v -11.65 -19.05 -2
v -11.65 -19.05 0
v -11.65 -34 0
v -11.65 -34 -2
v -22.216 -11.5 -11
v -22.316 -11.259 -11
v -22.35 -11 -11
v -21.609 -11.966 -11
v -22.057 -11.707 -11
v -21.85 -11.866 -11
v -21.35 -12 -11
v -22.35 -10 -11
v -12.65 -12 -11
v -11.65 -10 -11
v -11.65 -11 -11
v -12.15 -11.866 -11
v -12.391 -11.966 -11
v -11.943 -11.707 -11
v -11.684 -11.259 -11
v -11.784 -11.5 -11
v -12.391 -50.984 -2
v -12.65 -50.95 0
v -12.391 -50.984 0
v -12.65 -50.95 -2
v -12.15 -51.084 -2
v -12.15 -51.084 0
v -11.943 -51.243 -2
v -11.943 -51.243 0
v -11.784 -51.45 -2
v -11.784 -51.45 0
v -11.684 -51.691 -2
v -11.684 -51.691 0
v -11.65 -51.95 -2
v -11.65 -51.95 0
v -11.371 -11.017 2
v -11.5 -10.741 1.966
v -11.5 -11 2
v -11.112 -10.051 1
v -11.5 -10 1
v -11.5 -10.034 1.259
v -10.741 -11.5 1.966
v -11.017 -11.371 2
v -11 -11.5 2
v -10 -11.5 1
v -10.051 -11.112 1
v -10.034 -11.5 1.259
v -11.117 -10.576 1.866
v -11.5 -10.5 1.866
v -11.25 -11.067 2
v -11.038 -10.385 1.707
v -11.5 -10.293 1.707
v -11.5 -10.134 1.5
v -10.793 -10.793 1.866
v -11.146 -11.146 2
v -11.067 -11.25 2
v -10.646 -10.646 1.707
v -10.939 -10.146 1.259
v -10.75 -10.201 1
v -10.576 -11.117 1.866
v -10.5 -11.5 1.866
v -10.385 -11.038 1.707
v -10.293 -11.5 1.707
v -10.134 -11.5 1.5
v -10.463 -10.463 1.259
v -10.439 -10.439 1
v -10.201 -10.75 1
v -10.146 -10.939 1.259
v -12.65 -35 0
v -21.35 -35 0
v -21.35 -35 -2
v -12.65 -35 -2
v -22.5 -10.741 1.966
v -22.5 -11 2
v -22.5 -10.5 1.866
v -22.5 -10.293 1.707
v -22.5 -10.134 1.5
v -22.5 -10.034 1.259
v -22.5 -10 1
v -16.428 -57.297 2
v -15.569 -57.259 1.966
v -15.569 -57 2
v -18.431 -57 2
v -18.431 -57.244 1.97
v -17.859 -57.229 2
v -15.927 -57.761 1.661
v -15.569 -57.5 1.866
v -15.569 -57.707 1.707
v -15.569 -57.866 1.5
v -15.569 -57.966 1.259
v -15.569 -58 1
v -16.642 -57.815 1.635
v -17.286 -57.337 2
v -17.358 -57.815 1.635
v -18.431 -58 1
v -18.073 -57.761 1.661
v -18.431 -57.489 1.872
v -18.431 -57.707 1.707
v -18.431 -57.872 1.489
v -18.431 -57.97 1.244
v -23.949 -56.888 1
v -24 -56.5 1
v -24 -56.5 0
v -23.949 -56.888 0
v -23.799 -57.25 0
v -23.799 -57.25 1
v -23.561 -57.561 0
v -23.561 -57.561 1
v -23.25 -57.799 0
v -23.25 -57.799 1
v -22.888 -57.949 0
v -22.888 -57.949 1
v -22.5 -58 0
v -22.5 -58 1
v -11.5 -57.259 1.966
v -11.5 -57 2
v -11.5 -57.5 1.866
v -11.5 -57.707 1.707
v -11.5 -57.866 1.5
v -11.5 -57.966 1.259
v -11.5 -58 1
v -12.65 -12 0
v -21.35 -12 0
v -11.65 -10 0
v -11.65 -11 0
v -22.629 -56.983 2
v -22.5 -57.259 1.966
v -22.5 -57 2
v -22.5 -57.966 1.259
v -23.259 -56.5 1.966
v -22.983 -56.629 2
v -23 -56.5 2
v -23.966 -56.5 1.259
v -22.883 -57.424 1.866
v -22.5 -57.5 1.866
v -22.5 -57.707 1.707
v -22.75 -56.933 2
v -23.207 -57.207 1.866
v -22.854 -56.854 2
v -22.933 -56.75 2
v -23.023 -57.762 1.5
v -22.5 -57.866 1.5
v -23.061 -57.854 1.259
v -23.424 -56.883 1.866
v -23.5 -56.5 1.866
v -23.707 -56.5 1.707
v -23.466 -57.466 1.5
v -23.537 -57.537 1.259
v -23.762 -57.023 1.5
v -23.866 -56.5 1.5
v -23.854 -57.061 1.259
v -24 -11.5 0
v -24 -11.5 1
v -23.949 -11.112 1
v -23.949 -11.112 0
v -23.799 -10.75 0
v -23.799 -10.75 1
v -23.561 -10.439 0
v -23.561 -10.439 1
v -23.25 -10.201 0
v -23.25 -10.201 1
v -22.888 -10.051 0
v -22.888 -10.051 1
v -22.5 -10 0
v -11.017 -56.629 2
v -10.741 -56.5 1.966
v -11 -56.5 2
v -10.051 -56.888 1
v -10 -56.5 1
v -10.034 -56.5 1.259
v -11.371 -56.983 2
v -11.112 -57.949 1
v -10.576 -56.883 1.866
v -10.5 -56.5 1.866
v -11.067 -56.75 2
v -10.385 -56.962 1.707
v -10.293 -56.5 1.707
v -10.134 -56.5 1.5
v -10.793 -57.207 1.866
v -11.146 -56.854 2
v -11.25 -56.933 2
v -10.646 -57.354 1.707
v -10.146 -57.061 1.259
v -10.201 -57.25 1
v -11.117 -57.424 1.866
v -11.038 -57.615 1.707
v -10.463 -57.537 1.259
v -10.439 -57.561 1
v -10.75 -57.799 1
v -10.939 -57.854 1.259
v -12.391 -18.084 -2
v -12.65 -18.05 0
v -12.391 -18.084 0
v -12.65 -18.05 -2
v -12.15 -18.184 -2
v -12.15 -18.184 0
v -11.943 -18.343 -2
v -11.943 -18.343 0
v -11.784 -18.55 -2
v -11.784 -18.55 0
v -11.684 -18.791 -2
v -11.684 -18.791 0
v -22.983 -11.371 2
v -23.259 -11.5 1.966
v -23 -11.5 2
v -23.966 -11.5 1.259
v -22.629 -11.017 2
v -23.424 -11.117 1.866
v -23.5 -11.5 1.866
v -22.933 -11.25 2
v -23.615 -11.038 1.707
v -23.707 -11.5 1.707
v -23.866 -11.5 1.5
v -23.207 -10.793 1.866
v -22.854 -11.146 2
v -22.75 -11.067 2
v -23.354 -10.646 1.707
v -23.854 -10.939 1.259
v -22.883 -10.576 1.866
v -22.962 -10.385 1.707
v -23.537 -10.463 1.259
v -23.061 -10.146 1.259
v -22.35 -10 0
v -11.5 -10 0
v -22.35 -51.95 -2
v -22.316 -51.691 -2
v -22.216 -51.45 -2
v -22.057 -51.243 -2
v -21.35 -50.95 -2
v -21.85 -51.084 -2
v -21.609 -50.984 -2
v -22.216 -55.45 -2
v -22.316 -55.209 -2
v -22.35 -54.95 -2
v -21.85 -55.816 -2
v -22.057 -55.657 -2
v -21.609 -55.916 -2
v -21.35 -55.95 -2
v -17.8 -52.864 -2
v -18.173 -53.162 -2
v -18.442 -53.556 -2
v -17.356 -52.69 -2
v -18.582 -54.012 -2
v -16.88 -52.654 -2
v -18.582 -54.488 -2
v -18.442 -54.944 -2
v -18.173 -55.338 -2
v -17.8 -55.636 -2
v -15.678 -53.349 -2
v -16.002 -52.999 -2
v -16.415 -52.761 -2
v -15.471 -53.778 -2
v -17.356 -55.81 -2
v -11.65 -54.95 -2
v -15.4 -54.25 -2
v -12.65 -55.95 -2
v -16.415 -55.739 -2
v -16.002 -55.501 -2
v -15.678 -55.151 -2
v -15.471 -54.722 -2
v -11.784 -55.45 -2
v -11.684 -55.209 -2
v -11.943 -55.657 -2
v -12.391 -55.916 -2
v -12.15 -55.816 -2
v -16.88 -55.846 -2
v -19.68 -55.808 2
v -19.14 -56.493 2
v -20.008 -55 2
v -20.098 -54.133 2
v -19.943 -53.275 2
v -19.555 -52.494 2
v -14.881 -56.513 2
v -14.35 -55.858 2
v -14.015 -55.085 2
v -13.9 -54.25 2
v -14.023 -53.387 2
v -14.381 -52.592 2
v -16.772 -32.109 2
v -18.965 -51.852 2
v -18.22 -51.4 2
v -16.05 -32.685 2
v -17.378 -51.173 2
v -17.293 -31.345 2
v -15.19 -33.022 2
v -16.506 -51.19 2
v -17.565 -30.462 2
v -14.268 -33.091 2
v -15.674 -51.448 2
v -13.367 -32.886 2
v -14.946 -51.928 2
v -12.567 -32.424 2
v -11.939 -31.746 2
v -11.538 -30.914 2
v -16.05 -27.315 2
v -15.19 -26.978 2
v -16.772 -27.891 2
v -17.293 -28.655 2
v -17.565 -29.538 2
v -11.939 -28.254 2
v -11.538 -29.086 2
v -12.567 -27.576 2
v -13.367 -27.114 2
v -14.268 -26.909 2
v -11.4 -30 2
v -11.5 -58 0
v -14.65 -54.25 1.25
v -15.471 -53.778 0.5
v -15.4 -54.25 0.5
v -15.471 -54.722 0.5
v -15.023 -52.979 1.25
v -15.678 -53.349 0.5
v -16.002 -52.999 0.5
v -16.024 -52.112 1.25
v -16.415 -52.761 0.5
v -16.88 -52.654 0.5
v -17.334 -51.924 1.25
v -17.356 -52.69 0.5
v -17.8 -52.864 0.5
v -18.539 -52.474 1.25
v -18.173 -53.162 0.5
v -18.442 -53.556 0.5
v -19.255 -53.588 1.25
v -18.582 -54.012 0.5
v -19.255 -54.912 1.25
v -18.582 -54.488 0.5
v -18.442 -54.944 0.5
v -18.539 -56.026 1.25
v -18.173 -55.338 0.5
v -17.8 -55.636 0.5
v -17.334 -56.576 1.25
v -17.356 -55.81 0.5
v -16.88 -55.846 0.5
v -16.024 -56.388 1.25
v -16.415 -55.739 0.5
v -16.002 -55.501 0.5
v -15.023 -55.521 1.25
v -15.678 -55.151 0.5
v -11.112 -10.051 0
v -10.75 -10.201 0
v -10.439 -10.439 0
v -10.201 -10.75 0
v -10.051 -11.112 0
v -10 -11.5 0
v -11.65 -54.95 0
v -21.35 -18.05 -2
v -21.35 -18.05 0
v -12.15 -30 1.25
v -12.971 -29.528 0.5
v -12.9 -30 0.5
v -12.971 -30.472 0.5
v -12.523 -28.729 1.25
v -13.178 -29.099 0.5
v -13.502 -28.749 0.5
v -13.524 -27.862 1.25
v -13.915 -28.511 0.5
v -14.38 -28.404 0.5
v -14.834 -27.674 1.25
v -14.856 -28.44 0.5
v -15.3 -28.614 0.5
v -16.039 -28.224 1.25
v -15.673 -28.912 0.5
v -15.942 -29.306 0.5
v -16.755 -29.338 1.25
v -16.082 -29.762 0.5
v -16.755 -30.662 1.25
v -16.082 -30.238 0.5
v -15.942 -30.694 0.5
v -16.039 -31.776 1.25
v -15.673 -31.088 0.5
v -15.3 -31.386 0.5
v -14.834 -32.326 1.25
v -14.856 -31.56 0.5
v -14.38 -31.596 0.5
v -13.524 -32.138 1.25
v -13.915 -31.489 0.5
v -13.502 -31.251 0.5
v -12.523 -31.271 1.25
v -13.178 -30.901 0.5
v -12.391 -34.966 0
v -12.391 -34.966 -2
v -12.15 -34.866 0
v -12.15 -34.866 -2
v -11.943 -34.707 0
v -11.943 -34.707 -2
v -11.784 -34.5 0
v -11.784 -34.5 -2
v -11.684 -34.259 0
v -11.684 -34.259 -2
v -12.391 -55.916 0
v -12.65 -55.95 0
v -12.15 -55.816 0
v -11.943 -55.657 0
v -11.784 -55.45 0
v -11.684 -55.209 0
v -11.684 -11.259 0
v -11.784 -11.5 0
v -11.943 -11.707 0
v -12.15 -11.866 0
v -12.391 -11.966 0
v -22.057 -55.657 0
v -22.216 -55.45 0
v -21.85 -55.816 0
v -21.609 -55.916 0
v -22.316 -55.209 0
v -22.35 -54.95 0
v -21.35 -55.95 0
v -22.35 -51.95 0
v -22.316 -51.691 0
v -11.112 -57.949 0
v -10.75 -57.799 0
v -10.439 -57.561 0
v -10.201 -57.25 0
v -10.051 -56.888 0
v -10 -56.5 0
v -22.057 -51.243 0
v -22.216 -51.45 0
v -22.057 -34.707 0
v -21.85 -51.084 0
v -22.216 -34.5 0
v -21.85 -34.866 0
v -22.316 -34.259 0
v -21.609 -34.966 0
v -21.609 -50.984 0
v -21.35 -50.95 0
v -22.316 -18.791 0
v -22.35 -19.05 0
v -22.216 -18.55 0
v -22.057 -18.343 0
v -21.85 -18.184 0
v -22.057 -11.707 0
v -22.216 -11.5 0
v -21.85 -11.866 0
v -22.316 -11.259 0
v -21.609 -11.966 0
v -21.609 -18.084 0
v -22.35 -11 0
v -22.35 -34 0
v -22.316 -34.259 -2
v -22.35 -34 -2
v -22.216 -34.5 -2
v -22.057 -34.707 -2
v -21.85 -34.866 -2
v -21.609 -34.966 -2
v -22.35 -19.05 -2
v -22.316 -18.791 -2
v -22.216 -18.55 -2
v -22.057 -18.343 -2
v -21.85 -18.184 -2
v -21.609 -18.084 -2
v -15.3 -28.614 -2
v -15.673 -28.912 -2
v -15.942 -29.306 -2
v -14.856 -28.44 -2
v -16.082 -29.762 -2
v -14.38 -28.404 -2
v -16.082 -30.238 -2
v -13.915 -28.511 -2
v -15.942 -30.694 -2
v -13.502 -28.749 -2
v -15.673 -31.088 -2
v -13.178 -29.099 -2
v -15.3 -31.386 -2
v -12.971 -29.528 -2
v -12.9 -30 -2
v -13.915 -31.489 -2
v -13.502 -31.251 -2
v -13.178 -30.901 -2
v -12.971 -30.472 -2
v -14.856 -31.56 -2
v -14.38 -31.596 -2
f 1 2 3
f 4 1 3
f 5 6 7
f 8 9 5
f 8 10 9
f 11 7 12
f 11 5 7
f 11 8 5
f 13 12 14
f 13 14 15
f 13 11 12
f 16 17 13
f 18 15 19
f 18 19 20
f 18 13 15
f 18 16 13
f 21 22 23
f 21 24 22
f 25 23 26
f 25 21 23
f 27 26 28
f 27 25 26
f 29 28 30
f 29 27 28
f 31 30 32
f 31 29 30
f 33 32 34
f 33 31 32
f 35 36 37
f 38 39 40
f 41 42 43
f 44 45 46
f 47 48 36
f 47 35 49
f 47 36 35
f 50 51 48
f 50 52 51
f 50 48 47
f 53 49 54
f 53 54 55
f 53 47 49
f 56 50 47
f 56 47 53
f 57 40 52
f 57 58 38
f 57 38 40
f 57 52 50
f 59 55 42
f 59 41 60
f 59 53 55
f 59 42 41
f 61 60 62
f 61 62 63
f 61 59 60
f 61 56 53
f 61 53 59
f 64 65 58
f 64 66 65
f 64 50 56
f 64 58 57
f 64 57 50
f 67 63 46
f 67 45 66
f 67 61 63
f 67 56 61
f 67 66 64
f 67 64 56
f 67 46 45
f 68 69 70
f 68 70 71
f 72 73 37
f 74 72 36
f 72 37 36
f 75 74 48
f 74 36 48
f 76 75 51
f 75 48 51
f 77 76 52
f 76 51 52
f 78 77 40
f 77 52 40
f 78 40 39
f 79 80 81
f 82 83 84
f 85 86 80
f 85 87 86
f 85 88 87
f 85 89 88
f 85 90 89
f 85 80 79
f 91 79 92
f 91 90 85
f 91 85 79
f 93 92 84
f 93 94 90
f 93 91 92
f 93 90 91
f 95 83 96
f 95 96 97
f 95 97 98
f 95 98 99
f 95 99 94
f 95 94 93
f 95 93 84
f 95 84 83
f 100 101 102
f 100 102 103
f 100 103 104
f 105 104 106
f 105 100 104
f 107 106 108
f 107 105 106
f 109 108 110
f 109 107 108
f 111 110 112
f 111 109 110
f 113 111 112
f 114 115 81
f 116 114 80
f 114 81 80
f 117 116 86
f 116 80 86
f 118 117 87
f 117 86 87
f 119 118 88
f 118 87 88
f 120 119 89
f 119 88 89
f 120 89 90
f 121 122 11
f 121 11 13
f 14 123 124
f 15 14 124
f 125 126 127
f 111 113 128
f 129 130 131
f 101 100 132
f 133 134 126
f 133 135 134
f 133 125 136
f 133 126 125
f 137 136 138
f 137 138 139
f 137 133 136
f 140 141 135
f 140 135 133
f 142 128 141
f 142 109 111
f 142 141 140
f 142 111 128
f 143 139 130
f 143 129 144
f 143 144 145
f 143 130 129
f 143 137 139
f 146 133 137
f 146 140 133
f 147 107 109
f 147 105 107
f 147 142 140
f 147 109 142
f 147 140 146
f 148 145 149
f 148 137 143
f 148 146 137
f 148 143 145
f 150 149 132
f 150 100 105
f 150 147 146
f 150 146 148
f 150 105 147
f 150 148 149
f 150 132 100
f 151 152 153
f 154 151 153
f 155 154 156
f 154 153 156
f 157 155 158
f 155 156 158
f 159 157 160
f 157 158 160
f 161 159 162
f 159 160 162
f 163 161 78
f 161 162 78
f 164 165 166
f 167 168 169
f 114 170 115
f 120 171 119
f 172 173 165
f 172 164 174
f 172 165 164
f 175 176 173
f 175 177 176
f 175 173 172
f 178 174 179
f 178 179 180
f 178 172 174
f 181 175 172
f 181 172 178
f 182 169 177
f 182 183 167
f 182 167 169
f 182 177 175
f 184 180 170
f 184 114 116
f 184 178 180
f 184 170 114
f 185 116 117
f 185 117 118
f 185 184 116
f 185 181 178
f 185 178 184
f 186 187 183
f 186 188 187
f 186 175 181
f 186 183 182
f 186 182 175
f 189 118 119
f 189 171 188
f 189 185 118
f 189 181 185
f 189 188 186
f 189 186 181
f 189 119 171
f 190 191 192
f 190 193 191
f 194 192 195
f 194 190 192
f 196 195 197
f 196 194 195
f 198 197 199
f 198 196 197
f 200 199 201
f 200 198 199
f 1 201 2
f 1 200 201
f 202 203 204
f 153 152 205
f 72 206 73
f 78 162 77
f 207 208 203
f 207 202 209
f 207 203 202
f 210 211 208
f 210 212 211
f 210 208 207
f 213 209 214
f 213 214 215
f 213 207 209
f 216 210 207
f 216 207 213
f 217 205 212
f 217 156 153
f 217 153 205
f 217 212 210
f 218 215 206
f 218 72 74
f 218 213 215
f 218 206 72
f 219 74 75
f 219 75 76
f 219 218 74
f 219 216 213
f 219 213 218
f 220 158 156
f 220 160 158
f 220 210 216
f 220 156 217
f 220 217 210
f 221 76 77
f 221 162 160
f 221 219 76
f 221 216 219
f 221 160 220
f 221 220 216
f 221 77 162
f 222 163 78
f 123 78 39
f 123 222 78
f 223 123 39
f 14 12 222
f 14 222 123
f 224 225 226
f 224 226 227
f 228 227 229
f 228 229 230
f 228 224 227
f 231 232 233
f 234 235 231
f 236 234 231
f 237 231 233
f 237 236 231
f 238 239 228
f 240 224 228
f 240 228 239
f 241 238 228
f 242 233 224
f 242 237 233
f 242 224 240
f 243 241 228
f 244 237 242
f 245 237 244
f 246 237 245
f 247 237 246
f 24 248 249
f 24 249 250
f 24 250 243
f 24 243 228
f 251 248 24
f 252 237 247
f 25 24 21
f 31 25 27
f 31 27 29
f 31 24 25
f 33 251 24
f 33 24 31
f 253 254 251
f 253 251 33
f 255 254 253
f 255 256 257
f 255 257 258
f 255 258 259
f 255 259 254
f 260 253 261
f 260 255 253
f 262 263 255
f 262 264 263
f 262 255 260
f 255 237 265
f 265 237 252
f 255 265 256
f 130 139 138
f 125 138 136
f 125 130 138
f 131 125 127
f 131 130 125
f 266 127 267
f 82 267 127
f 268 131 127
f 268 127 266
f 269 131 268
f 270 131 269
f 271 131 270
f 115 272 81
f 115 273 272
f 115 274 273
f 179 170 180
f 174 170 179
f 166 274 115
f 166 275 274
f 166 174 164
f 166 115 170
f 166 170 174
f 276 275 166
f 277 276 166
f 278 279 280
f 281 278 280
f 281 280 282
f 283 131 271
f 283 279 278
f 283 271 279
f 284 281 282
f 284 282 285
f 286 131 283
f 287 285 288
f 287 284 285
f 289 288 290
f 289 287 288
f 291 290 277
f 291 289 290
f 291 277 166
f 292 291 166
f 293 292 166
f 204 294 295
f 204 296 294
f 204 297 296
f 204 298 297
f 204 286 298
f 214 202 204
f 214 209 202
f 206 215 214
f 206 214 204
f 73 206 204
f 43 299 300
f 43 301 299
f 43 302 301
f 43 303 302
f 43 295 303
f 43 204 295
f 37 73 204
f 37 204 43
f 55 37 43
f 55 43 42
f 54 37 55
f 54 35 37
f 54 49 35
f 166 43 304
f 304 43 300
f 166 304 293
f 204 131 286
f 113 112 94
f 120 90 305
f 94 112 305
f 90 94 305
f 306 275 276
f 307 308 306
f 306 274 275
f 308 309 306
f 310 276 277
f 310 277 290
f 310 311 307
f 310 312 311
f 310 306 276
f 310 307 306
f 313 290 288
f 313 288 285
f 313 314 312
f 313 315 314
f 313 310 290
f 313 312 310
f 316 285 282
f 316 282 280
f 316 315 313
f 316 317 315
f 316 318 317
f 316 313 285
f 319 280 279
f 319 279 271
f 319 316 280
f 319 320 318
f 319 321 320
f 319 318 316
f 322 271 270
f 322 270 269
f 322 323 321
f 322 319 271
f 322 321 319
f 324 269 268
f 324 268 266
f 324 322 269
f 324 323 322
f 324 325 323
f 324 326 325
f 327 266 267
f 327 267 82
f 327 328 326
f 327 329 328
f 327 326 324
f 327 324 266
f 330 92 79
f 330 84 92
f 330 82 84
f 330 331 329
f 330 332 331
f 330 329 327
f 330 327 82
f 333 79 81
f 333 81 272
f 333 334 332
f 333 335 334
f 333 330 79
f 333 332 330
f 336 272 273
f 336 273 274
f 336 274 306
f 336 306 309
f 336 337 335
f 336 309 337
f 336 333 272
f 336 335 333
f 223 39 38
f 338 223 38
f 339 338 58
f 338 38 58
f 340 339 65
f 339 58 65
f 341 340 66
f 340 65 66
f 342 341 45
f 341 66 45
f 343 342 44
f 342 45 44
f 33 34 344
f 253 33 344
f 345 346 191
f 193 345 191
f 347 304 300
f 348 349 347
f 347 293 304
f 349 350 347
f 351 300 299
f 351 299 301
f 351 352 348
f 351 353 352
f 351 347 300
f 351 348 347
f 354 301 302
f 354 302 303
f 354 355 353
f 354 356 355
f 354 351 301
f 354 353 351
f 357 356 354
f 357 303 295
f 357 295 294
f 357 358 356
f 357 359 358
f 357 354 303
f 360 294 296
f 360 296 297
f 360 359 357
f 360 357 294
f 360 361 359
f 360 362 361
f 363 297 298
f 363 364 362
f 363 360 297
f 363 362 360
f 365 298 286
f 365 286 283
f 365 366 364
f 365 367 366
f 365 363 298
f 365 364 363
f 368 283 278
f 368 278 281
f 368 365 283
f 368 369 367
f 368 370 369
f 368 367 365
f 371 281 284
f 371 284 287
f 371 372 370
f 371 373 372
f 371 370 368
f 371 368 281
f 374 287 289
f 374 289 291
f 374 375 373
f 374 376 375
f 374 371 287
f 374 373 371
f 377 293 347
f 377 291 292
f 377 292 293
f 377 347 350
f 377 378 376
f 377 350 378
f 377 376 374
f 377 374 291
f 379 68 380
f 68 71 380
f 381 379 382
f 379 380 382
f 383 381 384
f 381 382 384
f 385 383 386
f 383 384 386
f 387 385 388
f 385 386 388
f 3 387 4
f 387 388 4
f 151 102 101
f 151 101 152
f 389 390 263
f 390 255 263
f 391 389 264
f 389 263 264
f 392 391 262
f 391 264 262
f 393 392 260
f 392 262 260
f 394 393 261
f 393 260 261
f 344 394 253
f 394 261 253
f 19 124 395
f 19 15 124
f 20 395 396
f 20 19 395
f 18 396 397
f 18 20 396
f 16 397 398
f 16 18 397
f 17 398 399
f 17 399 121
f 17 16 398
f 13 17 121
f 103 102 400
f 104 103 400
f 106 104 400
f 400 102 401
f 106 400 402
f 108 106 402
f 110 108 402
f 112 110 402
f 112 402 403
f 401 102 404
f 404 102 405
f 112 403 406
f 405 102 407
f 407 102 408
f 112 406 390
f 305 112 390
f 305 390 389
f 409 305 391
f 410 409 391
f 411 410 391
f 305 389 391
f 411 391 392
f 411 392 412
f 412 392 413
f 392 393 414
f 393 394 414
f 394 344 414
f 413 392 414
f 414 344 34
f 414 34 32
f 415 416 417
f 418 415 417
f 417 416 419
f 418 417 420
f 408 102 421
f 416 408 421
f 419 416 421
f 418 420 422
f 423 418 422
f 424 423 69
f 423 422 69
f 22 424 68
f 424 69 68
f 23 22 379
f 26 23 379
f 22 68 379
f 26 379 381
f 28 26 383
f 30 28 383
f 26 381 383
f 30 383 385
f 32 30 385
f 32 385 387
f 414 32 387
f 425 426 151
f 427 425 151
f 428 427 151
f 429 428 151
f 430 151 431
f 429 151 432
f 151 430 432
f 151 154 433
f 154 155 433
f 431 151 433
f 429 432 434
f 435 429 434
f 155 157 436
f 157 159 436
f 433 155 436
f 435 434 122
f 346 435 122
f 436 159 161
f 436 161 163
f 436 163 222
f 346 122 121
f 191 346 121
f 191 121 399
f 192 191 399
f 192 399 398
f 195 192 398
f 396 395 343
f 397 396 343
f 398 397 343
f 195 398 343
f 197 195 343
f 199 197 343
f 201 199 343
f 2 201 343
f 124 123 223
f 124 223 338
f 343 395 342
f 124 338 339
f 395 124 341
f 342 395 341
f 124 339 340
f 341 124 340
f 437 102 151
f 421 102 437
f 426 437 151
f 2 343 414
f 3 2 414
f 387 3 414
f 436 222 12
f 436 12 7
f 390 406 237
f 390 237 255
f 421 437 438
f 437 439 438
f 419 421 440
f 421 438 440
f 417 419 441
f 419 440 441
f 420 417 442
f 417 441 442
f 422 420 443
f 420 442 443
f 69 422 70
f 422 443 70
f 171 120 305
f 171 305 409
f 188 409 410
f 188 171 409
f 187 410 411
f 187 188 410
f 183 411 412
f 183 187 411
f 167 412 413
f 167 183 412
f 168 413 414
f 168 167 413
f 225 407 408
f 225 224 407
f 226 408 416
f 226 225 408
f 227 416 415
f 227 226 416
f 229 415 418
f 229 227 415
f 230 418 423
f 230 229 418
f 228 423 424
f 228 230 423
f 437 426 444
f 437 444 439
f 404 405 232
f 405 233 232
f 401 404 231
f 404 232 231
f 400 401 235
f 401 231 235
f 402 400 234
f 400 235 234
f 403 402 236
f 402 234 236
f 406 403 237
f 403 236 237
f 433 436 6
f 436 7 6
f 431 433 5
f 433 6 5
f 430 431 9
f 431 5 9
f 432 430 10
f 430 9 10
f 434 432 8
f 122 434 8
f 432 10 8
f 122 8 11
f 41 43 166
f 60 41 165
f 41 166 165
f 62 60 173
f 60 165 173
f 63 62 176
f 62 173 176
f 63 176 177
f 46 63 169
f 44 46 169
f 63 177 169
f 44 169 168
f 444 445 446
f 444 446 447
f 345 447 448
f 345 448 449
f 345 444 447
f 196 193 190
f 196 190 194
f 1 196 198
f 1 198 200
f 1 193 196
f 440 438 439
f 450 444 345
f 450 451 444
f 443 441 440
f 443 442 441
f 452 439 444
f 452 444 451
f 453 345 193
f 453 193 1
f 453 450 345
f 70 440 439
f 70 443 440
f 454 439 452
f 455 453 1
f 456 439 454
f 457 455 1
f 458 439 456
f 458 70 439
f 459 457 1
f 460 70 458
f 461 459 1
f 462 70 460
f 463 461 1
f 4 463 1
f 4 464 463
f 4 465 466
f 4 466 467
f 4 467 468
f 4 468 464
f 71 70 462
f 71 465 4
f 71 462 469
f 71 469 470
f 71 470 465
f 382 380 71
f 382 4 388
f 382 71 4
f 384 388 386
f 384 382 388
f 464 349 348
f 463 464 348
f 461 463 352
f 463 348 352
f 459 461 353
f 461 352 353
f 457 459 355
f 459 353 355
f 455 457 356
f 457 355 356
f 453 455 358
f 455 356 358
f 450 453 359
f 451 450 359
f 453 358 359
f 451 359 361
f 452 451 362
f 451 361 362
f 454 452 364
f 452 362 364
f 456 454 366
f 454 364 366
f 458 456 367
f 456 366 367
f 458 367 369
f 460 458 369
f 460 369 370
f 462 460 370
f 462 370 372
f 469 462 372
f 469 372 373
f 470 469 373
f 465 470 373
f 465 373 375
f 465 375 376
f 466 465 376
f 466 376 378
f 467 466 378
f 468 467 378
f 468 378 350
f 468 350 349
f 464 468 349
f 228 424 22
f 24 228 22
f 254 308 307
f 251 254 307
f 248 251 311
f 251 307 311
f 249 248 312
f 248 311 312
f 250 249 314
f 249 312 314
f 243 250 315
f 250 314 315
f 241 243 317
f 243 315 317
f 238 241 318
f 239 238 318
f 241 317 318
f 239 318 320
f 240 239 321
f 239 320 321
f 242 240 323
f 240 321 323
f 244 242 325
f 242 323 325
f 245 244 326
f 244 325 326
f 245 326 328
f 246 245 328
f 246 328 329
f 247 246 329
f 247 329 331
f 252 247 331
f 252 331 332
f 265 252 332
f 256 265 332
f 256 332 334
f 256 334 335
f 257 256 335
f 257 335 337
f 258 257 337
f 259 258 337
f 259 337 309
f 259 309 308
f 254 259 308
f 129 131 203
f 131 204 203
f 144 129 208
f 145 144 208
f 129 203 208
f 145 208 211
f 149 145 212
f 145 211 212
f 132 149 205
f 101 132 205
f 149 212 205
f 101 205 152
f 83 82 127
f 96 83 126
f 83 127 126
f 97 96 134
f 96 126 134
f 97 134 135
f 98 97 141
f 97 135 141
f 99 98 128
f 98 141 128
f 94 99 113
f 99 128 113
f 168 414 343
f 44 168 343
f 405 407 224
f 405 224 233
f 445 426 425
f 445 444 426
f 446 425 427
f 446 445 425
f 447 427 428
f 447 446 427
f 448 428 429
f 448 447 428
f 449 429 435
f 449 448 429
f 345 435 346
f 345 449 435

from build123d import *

# Parameters (mm, degrees)
SKETCH041_W     = 14
SKETCH041_H     = 48
PAD017_DEPTH    = 2
SKETCH043_W     = 10.7
SKETCH043_H     = 16.95
SKETCH043_H_2   = 5
PAD018_DEPTH    = 2
SKETCH044_W     = 10.7
SKETCH044_H     = 2
PAD019_DEPTH    = 11
SKETCH045_R     = 1.6
POCKET019_DEPTH = 5
CHAMFER002_SIZE = 1.5
FILLET006_R     = 1.5
FILLET007_R     = 1
FILLET008_R     = 1


with BuildPart() as part:
    # Sketch041 → Pad017 (new body)
    with BuildSketch(Plane.XY):
        with Locations((-17, -34)):
            Rectangle(SKETCH041_W, SKETCH041_H)
    extrude(amount=PAD017_DEPTH)

    # Sketch043 (on Face5 of Pad017) → Pad018 (join)
    with BuildSketch(Plane(origin=(0, 0, 0), x_dir=(1, 0, 0), z_dir=(0, 0, -1))):
        with Locations((-17, 26.525)):
            Rectangle(SKETCH043_W, SKETCH043_H)
        with Locations((-17, 53.45)):
            Rectangle(SKETCH043_W, SKETCH043_H_2)
    extrude(amount=PAD018_DEPTH)

    # Sketch044 (on Face4 of Pad018) → Pad019 (join)
    with BuildSketch(Plane(origin=(0, 0, 0), x_dir=(1, 0, 0), z_dir=(0, 0, -1))):
        with Locations((-17, 11)):
            Rectangle(SKETCH044_W, SKETCH044_H)
    extrude(amount=PAD019_DEPTH)

    # Sketch045 (on Face5 of Pad019) → Pocket019 (cut)
    with BuildSketch(Plane.XY.offset(2)):
        with Locations((-14.5, -30)):
            Circle(SKETCH045_R)
        with Locations((-17, -54.25)):
            Circle(SKETCH045_R)
    extrude(amount=-POCKET019_DEPTH, mode=Mode.SUBTRACT)

    # Chamfer002
    chamfer002_edges = [part.edges().sort_by_distance(p)[0] for p in [
        (-16.1, -30, 2),
        (-18.6, -54.25, 2),
    ]]
    chamfer(chamfer002_edges, length=CHAMFER002_SIZE)

    # Fillet006
    fillet006_edges = [part.edges().sort_by_distance(p)[0] for p in [
        (-10, -58, 1),
        (-24, -58, 1),
        (-24, -10, 1),
        (-10, -10, 1),
    ]]
    fillet(fillet006_edges, radius=FILLET006_R)

    # Fillet007
    fillet007_edges = [part.edges().sort_by_distance(p)[0] for p in [
        (-24, -34, 2),
    ]]
    fillet(fillet007_edges, radius=FILLET007_R)

    # Fillet008
    fillet008_edges = [part.edges().sort_by_distance(p)[0] for p in [
        (-22.35, -55.95, -1),
        (-11.65, -55.95, -1),
        (-22.35, -35, -1),
        (-11.65, -35, -1),
        (-11.65, -12, -5.5),
        (-22.35, -12, -5.5),
        (-11.65, -18.05, -1),
        (-22.35, -18.05, -1),
        (-22.35, -50.95, -1),
        (-11.65, -50.95, -1),
    ]]
    fillet(fillet008_edges, radius=FILLET008_R)


solid = part.part
